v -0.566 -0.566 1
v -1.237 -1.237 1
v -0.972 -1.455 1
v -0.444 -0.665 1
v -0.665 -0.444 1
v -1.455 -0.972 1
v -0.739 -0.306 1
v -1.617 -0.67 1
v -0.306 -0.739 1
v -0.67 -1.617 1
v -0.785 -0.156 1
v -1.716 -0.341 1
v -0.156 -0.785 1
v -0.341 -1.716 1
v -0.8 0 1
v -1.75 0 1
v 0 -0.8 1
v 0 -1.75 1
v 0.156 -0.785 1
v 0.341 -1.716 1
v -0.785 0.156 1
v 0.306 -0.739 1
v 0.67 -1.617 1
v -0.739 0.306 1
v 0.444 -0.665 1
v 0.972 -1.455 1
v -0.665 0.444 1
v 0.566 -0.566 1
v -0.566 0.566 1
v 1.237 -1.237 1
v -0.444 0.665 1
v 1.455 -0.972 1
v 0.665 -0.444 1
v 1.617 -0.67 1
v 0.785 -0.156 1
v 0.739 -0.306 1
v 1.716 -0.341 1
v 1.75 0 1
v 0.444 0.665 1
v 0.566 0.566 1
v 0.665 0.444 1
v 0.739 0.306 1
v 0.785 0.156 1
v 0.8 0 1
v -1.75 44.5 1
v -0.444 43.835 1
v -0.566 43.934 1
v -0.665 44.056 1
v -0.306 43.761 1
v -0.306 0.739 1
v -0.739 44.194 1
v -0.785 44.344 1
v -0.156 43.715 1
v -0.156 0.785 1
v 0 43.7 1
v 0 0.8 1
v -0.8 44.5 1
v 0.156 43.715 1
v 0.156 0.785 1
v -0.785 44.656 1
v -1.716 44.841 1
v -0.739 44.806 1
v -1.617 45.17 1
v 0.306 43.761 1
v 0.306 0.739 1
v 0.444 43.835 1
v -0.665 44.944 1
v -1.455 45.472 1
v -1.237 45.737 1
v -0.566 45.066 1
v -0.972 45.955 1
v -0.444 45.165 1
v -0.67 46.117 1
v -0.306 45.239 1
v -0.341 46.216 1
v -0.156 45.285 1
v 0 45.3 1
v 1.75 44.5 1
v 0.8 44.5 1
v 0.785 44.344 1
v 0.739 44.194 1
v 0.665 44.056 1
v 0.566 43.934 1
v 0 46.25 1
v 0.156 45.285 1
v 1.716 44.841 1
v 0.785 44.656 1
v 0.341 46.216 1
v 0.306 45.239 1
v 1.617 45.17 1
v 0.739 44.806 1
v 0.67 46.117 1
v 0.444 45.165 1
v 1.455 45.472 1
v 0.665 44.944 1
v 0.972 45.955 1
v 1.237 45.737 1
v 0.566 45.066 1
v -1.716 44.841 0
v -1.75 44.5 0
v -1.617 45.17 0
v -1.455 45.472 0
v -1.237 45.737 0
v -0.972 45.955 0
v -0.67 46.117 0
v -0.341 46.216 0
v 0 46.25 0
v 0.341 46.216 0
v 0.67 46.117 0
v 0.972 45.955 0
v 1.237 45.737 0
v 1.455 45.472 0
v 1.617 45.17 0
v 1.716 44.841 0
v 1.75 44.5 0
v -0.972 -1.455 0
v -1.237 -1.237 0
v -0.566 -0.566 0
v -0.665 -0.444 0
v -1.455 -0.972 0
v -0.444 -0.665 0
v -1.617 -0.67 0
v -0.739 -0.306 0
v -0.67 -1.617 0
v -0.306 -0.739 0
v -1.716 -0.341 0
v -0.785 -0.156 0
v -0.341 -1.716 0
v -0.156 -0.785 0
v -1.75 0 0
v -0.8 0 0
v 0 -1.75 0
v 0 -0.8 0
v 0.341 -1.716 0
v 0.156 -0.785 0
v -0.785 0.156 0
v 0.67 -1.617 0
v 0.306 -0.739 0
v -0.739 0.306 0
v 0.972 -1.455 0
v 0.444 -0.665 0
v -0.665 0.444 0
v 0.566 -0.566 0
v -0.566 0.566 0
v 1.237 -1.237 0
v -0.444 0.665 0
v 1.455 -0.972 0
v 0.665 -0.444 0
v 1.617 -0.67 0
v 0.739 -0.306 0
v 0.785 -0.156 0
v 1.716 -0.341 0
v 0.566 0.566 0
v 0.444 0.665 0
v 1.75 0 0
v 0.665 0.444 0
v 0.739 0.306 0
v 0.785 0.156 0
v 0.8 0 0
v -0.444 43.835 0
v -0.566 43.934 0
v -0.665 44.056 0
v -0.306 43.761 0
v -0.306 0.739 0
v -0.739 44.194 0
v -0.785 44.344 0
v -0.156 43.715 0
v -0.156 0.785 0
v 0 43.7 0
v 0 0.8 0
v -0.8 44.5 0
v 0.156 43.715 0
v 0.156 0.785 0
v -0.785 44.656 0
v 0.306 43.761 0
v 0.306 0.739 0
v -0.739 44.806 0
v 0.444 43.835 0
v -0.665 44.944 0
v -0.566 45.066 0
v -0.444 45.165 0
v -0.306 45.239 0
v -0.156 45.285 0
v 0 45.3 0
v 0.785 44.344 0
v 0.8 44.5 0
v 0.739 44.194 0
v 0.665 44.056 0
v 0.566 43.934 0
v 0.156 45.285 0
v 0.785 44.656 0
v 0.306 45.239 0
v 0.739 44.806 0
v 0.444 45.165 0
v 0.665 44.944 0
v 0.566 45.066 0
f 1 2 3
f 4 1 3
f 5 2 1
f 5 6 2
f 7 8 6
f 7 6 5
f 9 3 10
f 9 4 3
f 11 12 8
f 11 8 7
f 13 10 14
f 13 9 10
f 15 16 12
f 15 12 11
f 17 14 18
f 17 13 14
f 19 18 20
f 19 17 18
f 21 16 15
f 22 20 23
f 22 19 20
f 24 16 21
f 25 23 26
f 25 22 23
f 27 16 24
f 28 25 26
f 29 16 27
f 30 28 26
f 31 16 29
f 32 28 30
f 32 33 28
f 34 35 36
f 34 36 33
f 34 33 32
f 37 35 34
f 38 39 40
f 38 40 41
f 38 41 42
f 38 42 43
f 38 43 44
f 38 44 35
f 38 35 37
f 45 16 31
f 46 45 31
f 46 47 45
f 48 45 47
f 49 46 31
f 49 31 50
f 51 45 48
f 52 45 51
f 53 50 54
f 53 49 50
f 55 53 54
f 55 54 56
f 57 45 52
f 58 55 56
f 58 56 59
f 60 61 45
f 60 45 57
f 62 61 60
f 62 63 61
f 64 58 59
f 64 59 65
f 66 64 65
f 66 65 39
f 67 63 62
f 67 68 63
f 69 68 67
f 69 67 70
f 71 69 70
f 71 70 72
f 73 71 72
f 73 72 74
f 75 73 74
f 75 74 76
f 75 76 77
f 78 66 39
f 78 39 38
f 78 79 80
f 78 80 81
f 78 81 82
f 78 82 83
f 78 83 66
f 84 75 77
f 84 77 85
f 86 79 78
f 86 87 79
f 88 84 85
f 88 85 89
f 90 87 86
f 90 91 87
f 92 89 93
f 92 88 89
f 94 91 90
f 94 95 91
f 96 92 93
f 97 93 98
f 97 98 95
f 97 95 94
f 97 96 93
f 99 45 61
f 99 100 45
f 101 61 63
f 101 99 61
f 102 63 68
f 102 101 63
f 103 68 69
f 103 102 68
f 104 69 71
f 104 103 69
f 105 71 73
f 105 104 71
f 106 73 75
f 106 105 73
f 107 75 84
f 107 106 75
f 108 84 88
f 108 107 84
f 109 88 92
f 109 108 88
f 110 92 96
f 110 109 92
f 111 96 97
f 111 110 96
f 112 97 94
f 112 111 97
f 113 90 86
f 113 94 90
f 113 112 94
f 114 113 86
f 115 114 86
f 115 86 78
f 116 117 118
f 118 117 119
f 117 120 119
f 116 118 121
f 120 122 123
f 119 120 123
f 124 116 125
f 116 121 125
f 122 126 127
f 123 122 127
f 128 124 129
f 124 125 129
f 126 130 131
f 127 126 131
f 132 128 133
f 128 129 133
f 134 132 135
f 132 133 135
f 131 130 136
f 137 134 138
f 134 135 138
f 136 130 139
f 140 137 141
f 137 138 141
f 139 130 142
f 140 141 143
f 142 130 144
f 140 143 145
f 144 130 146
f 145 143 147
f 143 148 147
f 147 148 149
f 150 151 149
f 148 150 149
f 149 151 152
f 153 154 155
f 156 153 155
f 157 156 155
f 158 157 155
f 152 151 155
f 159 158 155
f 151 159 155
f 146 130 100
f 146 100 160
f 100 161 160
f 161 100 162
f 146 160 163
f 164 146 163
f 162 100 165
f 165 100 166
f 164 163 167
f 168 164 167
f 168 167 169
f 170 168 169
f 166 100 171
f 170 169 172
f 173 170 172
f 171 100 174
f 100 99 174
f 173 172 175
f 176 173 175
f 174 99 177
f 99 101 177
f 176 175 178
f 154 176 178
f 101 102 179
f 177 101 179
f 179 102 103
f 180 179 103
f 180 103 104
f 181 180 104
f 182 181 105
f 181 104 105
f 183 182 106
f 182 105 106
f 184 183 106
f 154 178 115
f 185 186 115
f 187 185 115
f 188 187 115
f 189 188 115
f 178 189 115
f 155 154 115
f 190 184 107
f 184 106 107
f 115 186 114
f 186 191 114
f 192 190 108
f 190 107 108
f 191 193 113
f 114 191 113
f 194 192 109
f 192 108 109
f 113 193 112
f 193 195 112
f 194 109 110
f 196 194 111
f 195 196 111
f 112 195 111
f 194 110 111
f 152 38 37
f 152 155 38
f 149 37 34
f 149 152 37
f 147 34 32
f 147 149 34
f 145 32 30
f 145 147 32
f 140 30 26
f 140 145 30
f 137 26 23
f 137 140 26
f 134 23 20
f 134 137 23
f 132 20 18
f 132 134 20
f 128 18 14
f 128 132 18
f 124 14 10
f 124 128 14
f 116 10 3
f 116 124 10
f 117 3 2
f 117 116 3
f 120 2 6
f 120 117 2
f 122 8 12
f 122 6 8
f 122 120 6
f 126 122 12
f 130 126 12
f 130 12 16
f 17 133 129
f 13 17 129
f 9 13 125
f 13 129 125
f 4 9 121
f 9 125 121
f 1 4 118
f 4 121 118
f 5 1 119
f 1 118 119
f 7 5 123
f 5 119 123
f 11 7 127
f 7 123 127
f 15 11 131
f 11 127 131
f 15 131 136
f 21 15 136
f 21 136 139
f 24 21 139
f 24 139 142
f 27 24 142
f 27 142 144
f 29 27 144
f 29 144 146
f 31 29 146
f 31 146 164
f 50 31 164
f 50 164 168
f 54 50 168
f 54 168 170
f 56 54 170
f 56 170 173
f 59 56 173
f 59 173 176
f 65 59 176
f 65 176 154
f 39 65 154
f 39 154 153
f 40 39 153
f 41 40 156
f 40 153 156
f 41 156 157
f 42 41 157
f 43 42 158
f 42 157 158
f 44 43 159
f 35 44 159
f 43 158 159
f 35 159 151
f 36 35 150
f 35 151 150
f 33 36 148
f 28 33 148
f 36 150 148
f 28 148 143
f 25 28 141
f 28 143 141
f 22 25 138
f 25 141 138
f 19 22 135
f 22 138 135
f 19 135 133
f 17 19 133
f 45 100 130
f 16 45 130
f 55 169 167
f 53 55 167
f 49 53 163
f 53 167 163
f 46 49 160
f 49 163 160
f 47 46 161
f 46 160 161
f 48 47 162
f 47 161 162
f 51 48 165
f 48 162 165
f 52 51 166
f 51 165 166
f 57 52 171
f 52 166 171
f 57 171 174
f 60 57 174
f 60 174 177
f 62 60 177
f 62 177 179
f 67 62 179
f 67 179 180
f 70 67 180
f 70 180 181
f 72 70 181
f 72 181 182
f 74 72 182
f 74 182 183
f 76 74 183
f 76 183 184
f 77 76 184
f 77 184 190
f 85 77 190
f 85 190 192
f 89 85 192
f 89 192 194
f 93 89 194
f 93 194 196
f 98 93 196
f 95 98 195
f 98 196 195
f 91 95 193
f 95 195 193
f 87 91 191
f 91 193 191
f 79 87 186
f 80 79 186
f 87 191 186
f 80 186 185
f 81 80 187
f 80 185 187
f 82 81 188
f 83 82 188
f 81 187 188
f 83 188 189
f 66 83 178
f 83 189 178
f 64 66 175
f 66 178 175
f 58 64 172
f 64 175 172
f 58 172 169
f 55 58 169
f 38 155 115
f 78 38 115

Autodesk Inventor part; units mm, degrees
ref_plane "YZ Plane" through (0, 0, 0) normal (1, 0, 0) x (0, 1, 0)
ref_plane "XZ Plane" through (0, 0, 0) normal (0, 1, 0) x (-1, 0, 0)
ref_plane "XY Plane" through (0, 0, 0) normal (0, 0, 1) x (1, 0, 0)
sketch "Skizze1" plane through (0, 0, 0) normal (0, 0, 1) x (1, 0, 0)
  line L0 (0, 0) -> (0, 44.5) construction
  line L1 (1.75, 0) -> (1.75, 44.5)
  line L2 (-1.75, 44.5) -> (-1.75, 0)
  arc A0 (-1.75, 0) -> (1.75, 0) centre (0, 0) ccw
  arc A1 (1.75, 44.5) -> (-1.75, 44.5) centre (0, 44.5) ccw
  point P0 (0, 22.25)
  dimension "d0" = 44.5
  dimension "d1" = 3.5
extrude "Extrusion1" add sketch "Skizze1" along normal blind 1
sketch "Skizze2" plane through (0, 0, 1) normal (0, 0, 1) x (1, 0, 0)
  arc A0 (1.75, 44.5) -> (-1.75, 44.5) centre (0, 44.5) ccw projected
  point P0 (0, 0)
hole "Bohrung1" at (0, 44.5, 1) at (0, 0, 1) direction (0, 0, -1) diameter 1.6 depth 1
properties part number "pleuelstange" material "Titan"
